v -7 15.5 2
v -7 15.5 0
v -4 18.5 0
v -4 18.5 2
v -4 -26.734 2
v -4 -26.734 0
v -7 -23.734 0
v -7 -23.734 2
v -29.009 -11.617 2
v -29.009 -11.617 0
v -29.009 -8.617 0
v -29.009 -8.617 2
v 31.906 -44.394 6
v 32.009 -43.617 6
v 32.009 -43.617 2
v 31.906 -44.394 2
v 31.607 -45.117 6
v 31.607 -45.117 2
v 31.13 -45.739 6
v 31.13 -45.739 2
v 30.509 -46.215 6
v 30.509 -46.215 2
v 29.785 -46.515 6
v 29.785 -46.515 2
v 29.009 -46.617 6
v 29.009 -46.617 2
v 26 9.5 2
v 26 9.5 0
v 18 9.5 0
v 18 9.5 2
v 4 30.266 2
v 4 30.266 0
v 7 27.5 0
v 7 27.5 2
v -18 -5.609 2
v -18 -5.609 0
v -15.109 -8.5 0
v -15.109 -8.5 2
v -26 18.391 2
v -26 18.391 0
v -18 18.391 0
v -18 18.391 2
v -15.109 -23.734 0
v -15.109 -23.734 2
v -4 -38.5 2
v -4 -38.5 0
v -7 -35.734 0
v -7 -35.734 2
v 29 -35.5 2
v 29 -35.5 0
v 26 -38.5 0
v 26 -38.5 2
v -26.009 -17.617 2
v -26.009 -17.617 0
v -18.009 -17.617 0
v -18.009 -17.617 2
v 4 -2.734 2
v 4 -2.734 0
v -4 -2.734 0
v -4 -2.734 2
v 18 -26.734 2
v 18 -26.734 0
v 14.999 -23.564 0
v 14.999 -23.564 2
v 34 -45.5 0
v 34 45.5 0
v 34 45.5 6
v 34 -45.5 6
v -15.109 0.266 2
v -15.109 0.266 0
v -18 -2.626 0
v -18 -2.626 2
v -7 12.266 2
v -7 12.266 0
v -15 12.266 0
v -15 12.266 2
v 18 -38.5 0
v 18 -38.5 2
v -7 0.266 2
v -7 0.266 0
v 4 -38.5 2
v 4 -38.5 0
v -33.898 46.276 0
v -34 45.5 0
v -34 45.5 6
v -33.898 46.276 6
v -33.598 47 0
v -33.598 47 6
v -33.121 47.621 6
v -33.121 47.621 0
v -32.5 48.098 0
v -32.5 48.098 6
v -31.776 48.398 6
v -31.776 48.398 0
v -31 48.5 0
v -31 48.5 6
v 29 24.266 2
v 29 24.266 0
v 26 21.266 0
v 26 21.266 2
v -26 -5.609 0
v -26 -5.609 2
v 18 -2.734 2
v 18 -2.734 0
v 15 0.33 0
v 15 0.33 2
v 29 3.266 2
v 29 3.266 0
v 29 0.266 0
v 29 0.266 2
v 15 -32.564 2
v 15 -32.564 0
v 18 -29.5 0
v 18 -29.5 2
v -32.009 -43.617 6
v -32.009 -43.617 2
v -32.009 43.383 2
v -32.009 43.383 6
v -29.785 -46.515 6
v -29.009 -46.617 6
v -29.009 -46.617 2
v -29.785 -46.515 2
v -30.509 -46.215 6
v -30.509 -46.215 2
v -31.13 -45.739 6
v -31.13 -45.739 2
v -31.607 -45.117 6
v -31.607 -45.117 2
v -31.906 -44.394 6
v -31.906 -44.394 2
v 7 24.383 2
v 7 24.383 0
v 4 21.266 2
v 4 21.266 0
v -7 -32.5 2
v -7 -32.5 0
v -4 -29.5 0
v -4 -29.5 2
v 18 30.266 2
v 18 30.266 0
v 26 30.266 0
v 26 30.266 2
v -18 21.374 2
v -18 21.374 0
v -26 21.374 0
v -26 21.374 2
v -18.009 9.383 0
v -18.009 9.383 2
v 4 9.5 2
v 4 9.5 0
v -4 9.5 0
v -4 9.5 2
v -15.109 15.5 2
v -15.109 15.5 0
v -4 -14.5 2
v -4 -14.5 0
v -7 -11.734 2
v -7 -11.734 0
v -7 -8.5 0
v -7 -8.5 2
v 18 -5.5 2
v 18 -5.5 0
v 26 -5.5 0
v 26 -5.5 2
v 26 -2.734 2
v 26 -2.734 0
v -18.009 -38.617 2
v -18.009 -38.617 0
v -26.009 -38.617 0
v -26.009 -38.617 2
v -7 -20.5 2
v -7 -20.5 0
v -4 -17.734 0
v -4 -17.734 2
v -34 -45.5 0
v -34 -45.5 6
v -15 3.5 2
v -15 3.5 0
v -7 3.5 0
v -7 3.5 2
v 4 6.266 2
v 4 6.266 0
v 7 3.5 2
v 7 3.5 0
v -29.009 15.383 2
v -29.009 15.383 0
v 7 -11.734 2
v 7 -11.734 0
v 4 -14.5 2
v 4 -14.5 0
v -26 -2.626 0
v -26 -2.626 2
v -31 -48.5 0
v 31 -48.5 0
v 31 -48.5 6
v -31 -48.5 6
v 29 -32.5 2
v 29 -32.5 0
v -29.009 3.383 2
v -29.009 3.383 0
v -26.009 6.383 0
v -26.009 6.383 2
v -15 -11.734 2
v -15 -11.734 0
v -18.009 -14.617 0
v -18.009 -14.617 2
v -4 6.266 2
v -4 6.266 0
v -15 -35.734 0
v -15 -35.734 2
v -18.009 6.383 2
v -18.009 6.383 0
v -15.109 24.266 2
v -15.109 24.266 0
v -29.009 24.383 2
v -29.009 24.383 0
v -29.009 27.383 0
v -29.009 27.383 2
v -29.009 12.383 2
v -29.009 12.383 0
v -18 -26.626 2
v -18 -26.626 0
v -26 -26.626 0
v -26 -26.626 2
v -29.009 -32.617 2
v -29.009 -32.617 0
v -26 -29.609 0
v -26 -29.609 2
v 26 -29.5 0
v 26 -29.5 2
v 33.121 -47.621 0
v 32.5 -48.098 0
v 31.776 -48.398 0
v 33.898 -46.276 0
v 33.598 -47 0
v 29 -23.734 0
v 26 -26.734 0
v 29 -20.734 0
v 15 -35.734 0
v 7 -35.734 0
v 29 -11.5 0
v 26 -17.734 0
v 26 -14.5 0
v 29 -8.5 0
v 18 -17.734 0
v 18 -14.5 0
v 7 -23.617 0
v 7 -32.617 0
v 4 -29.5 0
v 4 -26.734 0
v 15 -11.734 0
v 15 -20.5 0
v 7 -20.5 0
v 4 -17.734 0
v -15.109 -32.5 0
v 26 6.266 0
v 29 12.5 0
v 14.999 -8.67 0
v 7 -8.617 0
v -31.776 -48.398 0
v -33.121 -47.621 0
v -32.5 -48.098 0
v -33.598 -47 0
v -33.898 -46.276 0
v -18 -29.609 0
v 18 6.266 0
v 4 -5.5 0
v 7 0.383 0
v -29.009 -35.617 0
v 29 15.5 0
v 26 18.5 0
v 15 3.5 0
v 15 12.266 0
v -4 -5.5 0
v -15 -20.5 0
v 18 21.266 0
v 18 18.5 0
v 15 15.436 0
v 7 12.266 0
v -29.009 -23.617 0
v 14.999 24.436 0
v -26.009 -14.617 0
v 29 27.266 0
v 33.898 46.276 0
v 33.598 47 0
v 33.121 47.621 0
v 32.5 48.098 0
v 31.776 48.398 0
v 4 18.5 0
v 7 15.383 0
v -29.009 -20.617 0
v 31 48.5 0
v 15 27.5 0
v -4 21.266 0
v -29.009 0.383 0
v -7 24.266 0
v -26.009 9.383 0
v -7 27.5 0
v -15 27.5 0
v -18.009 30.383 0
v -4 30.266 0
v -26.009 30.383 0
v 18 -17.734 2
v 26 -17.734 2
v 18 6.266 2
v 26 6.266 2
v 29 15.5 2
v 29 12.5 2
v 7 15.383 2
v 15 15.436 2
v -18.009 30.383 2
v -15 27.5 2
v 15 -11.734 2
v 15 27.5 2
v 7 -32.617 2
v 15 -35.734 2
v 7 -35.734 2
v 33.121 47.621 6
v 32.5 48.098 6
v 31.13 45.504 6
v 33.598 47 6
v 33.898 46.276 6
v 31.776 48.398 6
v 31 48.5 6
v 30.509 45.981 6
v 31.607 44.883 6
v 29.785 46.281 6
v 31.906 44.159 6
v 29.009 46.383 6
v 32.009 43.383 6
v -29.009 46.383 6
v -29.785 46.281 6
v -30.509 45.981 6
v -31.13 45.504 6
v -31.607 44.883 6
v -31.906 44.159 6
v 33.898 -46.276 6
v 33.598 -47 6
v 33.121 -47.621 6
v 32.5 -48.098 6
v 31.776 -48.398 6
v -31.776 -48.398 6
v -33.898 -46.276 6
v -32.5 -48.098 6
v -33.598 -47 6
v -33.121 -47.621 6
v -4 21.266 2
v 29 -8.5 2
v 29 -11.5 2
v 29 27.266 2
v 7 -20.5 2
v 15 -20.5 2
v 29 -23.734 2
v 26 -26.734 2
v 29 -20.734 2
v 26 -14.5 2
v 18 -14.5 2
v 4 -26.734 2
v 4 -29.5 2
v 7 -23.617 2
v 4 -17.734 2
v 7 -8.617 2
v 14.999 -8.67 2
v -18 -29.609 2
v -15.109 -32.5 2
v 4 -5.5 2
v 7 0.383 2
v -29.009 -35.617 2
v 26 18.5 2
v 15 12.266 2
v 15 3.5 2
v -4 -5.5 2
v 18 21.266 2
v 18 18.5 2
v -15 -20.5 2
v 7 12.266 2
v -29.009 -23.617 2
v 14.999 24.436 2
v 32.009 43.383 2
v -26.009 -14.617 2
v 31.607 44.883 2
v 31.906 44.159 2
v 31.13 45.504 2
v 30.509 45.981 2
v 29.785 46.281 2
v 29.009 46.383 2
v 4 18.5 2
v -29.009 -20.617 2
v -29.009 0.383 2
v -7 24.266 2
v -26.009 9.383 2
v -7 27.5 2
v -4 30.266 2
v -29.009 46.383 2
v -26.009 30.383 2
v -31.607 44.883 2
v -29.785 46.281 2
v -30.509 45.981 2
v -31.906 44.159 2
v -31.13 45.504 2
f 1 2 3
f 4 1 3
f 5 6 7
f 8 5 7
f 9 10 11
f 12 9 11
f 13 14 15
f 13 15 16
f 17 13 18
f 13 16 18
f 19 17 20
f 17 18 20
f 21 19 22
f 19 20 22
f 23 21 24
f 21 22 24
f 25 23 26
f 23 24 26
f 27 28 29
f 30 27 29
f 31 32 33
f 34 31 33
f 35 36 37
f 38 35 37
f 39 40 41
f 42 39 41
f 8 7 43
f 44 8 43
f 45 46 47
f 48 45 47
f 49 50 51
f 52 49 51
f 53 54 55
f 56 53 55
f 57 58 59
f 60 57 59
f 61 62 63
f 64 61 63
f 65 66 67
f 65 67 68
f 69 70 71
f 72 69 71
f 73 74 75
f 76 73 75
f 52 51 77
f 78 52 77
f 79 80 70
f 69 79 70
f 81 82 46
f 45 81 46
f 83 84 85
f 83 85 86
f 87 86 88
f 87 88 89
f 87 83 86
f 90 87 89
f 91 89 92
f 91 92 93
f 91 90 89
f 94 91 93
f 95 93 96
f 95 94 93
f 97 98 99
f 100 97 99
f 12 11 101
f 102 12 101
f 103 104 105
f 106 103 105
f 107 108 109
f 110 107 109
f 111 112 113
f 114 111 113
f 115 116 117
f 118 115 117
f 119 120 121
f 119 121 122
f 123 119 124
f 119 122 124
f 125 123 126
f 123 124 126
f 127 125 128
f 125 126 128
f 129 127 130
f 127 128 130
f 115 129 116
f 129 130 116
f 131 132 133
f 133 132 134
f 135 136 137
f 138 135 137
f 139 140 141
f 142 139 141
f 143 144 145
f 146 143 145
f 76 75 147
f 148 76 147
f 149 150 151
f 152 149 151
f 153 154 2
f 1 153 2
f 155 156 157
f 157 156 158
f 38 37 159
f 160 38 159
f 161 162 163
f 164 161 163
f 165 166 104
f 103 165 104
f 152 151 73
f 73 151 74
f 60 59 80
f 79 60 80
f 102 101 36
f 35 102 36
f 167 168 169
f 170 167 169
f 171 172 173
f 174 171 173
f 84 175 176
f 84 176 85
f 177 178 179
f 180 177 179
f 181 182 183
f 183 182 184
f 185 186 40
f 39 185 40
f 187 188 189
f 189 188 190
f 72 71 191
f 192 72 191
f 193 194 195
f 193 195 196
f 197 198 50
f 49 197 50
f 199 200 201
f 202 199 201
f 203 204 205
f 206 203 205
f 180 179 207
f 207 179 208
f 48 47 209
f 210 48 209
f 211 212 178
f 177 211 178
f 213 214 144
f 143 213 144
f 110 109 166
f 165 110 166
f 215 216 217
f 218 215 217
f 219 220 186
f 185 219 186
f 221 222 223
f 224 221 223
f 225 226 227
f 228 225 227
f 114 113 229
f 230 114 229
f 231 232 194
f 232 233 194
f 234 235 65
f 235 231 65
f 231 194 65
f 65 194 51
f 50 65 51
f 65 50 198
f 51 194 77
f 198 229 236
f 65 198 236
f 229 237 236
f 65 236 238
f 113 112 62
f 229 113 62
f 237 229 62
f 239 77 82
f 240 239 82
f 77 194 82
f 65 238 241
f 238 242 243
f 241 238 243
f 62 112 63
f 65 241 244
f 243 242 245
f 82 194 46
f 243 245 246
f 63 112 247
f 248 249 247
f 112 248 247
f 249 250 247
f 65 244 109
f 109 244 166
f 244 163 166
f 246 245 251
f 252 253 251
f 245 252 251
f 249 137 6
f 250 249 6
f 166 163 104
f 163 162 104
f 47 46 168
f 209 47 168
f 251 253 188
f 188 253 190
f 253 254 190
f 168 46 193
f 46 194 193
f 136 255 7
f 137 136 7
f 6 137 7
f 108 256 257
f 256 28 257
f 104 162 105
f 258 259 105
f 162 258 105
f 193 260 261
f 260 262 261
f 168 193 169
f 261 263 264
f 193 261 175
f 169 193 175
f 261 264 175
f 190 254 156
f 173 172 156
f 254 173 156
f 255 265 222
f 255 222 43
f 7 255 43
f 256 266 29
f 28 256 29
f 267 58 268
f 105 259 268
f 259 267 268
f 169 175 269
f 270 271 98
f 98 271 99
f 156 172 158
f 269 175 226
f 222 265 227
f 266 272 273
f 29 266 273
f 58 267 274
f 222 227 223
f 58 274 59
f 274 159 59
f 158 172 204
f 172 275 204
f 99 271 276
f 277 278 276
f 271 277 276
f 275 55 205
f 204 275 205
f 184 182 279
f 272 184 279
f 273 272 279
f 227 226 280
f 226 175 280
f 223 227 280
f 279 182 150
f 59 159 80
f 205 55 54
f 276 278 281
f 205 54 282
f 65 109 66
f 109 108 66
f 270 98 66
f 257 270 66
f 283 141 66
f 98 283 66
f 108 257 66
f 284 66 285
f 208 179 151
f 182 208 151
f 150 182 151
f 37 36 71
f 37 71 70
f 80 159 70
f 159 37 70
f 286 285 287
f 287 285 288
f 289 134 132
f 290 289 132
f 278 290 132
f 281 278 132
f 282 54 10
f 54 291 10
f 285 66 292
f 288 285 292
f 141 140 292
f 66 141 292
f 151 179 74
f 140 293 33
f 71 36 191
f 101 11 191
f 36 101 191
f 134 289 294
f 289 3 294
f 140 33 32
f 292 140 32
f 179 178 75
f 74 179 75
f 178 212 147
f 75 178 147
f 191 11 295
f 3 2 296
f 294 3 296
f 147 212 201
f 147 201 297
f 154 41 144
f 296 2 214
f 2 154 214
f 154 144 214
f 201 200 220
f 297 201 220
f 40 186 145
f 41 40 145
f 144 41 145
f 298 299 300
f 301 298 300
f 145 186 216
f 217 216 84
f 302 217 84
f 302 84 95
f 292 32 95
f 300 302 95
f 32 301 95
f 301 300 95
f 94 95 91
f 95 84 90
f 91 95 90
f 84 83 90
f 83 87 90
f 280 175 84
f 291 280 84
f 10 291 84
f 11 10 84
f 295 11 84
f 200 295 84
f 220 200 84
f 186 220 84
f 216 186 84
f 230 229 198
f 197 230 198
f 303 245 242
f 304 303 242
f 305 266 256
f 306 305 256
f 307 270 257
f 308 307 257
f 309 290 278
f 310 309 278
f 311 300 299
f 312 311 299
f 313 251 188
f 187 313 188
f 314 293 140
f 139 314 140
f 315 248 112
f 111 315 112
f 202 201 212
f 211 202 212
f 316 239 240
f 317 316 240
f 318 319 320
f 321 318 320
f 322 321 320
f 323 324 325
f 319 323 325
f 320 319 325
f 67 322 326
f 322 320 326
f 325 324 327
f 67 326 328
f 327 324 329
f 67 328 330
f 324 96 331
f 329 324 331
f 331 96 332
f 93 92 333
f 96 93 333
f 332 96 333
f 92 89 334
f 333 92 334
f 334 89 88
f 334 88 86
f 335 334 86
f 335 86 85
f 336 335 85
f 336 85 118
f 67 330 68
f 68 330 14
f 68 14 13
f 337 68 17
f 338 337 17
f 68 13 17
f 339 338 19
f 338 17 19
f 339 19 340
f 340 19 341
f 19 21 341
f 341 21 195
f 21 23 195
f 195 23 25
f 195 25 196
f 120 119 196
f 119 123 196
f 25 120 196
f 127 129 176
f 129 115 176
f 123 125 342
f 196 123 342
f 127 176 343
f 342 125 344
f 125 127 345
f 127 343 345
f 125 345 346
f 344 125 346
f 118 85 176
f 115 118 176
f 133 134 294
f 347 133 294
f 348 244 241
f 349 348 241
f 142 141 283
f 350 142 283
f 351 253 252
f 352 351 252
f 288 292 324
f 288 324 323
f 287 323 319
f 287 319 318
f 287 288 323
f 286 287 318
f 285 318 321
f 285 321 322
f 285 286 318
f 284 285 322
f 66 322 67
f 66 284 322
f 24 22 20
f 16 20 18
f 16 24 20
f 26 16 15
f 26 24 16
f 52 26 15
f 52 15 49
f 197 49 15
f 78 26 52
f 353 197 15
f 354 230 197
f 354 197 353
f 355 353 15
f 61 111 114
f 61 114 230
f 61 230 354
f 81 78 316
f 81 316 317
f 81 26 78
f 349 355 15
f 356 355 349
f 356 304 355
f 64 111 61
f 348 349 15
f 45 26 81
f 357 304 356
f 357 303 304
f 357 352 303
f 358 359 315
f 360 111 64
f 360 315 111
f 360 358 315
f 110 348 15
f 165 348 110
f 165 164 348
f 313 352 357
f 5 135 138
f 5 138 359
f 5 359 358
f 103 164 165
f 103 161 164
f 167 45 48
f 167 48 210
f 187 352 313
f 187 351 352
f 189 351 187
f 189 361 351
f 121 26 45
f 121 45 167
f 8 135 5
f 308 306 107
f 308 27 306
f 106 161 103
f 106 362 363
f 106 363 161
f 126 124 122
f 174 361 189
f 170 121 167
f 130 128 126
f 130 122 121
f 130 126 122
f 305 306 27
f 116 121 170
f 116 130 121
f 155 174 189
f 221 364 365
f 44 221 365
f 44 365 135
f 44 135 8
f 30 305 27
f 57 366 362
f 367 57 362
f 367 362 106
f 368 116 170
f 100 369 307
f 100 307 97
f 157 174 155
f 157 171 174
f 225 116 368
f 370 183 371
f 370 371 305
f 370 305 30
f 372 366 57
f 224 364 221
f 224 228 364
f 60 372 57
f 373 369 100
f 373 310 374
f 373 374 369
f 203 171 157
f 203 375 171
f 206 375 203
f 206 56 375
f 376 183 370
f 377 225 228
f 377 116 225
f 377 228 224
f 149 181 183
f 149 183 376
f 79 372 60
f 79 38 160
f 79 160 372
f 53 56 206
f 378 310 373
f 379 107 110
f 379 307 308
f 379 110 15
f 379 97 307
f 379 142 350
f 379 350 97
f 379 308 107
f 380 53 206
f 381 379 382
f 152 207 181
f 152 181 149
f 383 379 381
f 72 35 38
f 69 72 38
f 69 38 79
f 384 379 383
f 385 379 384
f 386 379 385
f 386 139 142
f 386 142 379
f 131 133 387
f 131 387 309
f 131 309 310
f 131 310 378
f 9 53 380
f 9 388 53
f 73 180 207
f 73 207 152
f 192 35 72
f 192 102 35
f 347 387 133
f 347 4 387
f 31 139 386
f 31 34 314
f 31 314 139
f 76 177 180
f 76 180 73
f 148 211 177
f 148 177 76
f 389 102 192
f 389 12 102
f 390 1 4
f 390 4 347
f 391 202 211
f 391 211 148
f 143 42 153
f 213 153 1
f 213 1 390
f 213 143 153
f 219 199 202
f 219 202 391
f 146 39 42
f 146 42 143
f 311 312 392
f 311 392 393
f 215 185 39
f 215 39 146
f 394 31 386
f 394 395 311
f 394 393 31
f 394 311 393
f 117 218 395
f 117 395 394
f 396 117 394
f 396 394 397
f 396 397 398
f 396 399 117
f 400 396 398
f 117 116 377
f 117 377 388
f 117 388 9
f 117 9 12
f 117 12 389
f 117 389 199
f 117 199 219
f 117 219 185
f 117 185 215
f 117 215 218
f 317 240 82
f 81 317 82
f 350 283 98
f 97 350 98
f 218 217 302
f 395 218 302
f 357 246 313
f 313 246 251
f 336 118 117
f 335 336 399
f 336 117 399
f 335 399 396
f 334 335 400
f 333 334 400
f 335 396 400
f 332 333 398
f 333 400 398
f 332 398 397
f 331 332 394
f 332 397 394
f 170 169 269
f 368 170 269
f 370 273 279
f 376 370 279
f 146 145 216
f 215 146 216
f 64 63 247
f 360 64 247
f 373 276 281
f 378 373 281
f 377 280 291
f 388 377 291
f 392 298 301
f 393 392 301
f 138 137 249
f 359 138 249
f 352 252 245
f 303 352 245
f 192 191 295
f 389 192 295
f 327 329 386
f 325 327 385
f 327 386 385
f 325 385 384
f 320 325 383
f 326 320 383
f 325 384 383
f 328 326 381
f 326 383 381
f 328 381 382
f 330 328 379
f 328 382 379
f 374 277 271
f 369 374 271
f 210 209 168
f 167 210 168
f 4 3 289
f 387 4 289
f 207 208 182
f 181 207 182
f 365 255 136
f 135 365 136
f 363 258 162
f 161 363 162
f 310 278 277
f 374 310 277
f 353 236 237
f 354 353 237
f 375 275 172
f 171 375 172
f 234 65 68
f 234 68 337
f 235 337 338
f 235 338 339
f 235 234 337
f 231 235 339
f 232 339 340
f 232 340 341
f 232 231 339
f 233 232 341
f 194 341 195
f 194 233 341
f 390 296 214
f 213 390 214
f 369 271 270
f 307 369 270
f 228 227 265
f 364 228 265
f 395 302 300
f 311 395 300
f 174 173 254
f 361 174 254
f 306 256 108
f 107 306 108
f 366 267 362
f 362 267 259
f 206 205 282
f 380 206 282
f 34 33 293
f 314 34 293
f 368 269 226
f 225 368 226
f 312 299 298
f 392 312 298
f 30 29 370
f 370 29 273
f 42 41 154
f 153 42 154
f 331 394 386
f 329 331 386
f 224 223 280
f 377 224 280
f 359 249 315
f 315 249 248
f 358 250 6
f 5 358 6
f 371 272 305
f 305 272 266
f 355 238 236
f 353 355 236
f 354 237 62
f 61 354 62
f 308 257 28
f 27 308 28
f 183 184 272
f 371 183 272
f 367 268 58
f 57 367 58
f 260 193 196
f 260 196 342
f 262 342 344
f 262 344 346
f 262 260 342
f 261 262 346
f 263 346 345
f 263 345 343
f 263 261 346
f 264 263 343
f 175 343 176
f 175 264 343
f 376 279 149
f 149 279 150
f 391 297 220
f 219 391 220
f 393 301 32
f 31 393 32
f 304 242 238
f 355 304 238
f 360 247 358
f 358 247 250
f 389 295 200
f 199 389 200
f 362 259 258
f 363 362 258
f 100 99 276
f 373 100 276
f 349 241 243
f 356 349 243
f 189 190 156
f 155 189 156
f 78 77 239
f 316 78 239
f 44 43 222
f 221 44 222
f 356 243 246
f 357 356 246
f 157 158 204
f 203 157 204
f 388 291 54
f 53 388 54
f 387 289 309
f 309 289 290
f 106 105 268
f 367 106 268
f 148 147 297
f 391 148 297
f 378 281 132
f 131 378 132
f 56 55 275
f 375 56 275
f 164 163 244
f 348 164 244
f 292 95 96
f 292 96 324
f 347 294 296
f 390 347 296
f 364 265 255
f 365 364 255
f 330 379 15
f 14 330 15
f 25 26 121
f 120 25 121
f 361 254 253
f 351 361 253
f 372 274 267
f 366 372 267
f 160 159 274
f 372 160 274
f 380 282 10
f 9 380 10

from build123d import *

# Parameters (mm, degrees)
BOSS_EXTRUDE1_DEPTH = 6
BOSS_EXTRUDE2_DEPTH = 2


with BuildPart() as part:
    # Sketch1 → Boss-Extrude1 (new body)
    with BuildSketch(Plane(origin=(0, 0, 0), x_dir=(0, 1, 0), z_dir=(0, 0, 1))):
        with BuildLine():
            Line((-45.5, -34), (45.5, -34))
            ThreePointArc((45.5, -34), (47.621320344, -33.121320344), (48.5, -31))
            Line((48.5, -31), (48.5, 31))
            ThreePointArc((48.5, 31), (47.621320344, 33.121320344), (45.5, 34))
            Line((45.5, 34), (-45.5, 34))
            ThreePointArc((-45.5, 34), (-47.621320344, 33.121320344), (-48.5, 31))
            Line((-48.5, 31), (-48.5, -31))
            ThreePointArc((-48.5, -31), (-47.621320344, -33.121320344), (-45.5, -34))
        make_face()
        with BuildLine():
            Line((46.382784344, 29.008682641), (46.382784344, -29.008682641))
            ThreePointArc((46.382784344, -29.008682641), (45.504104688, -31.130002985), (43.382784344, -32.008682641))
            Line((43.382784344, -32.008682641), (-43.617215656, -32.008682641))
            ThreePointArc((-43.617215656, -32.008682641), (-45.738535999, -31.130002985), (-46.617215656, -29.008682641))
            Line((-46.617215656, -29.008682641), (-46.617215656, 29.008682641))
            ThreePointArc((-46.617215656, 29.008682641), (-45.738535999, 31.130002985), (-43.617215656, 32.008682641))
            Line((-43.617215656, 32.008682641), (43.382784344, 32.008682641))
            ThreePointArc((43.382784344, 32.008682641), (45.504104688, 31.130002985), (46.382784344, 29.008682641))
        make_face(mode=Mode.SUBTRACT)
    extrude(amount=BOSS_EXTRUDE1_DEPTH)

    # Sketch1<3> → Boss-Extrude2 (add)
    with BuildSketch(Plane(origin=(0, 0, 0), x_dir=(0, 1, 0), z_dir=(0, 0, 1))):
        with BuildLine():
            ThreePointArc((43.382784344, -32.008682641), (45.504104688, -31.130002985), (46.382784344, -29.008682641))
            Line((46.382784344, -29.008682641), (46.382784344, 29.008682641))
            ThreePointArc((46.382784344, 29.008682641), (45.504104688, 31.130002985), (43.382784344, 32.008682641))
            Line((43.382784344, 32.008682641), (-43.617215656, 32.008682641))
            ThreePointArc((-43.617215656, 32.008682641), (-45.738535999, 31.130002985), (-46.617215656, 29.008682641))
            Line((-46.617215656, 29.008682641), (-46.617215656, -29.008682641))
            ThreePointArc((-46.617215656, -29.008682641), (-45.738535999, -31.130002985), (-43.617215656, -32.008682641))
            Line((-43.617215656, -32.008682641), (43.382784344, -32.008682641))
        make_face()
        Polygon((-38.617215656, 18.008682641), (-38.617215656, 26.008682641), (-35.617215656, 29.008682641), (-32.617215656, 29.008682641), (-29.608533015, 26), (-29.608533015, 18), (-32.5, 15.108533015), (-32.5, 7), (-29.5, 4), (-29.5, -4), (-32.617231433, -6.999999928), (-32.564041089, -14.9998231), (-29.5, -18), (-29.5, -26), (-32.5, -29), (-35.5, -29), (-38.5, -26), (-38.5, -18), (-35.734431311, -15), (-35.734431311, -7), (-38.5, -4), (-38.5, 4), (-35.734431311, 7), (-35.734431311, 15), align=None, mode=Mode.SUBTRACT)
        Polygon((-17.734431311, -26), (-20.734431311, -29), (-23.734431311, -29), (-26.734431311, -26), (-26.734431311, -18), (-23.564091544, -14.998869032), (-23.617199878, -6.999999928), (-26.734431311, -4), (-26.734431311, 4), (-23.734431311, 7), (-23.734431311, 15.108533015), (-26.625898297, 18), (-26.625898297, 26), (-23.617215656, 29.008682641), (-20.617215656, 29.008682641), (-17.617215656, 26.008682641), (-17.617215656, 18.008682641), (-20.5, 15), (-20.5, 7), (-17.734431311, 4), (-17.734431311, -4), (-20.5, -7), (-20.5, -15), (-17.734431311, -18), align=None, mode=Mode.SUBTRACT)
        Polygon((-5.5, -4), (-8.617231433, -6.999999928), (-8.670339768, -14.998869032), (-5.5, -18), (-5.5, -26), (-8.5, -29), (-11.5, -29), (-14.5, -26), (-14.5, -18), (-11.734431311, -15), (-11.734431311, -7), (-14.5, -4), (-14.5, 4), (-11.734431311, 7), (-11.734431311, 15), (-14.617215656, 18.008682641), (-14.617215656, 26.008682641), (-11.617215656, 29.008682641), (-8.617215656, 29.008682641), (-5.608533015, 26), (-5.608533015, 18), (-8.5, 15.108533015), (-8.5, 7), (-5.5, 4), align=None, mode=Mode.SUBTRACT)
        Polygon((3.265568689, -29), (0.265568689, -29), (-2.734431311, -26), (-2.734431311, -18), (0.329609777, -14.9998231), (0.382800122, -6.999999928), (-2.734431311, -4), (-2.734431311, 4), (0.265568689, 7), (0.265568689, 15.108533015), (-2.625898297, 18), (-2.625898297, 26), (0.382784344, 29.008682641), (3.382784344, 29.008682641), (6.382784344, 26.008682641), (6.382784344, 18.008682641), (3.5, 15), (3.5, 7), (6.265568689, 4), (6.265568689, -4), (3.5, -7), (3.5, -15), (6.265568689, -18), (6.265568689, -26), align=None, mode=Mode.SUBTRACT)
        Polygon((15.5, -29), (12.5, -29), (9.5, -26), (9.5, -18), (12.265568689, -15), (12.265568689, -7), (9.5, -4), (9.5, 4), (12.265568689, 7), (12.265568689, 15), (9.382784344, 18.008682641), (9.382784344, 26.008682641), (12.382784344, 29.008682641), (15.382784344, 29.008682641), (18.391466985, 26), (18.391466985, 18), (15.5, 15.108533015), (15.5, 7), (18.5, 4), (18.5, -4), (15.382768567, -6.999999928), (15.435958911, -14.9998231), (18.5, -18), (18.5, -26), align=None, mode=Mode.SUBTRACT)
        Polygon((30.265568689, -26), (27.265568689, -29), (24.265568689, -29), (21.265568689, -26), (21.265568689, -18), (24.435908456, -14.998869032), (24.382800122, -6.999999928), (21.265568689, -4), (21.265568689, 4), (24.265568689, 7), (24.265568689, 15.108533015), (21.374101703, 18), (21.374101703, 26), (24.382784344, 29.008682641), (27.382784344, 29.008682641), (30.382784344, 26.008682641), (30.382784344, 18.008682641), (27.5, 15), (27.5, 7), (30.265568689, 4), (30.265568689, -4), (27.5, -7), (27.5, -15), (30.265568689, -18), align=None, mode=Mode.SUBTRACT)
    extrude(amount=BOSS_EXTRUDE2_DEPTH)


solid = part.part
